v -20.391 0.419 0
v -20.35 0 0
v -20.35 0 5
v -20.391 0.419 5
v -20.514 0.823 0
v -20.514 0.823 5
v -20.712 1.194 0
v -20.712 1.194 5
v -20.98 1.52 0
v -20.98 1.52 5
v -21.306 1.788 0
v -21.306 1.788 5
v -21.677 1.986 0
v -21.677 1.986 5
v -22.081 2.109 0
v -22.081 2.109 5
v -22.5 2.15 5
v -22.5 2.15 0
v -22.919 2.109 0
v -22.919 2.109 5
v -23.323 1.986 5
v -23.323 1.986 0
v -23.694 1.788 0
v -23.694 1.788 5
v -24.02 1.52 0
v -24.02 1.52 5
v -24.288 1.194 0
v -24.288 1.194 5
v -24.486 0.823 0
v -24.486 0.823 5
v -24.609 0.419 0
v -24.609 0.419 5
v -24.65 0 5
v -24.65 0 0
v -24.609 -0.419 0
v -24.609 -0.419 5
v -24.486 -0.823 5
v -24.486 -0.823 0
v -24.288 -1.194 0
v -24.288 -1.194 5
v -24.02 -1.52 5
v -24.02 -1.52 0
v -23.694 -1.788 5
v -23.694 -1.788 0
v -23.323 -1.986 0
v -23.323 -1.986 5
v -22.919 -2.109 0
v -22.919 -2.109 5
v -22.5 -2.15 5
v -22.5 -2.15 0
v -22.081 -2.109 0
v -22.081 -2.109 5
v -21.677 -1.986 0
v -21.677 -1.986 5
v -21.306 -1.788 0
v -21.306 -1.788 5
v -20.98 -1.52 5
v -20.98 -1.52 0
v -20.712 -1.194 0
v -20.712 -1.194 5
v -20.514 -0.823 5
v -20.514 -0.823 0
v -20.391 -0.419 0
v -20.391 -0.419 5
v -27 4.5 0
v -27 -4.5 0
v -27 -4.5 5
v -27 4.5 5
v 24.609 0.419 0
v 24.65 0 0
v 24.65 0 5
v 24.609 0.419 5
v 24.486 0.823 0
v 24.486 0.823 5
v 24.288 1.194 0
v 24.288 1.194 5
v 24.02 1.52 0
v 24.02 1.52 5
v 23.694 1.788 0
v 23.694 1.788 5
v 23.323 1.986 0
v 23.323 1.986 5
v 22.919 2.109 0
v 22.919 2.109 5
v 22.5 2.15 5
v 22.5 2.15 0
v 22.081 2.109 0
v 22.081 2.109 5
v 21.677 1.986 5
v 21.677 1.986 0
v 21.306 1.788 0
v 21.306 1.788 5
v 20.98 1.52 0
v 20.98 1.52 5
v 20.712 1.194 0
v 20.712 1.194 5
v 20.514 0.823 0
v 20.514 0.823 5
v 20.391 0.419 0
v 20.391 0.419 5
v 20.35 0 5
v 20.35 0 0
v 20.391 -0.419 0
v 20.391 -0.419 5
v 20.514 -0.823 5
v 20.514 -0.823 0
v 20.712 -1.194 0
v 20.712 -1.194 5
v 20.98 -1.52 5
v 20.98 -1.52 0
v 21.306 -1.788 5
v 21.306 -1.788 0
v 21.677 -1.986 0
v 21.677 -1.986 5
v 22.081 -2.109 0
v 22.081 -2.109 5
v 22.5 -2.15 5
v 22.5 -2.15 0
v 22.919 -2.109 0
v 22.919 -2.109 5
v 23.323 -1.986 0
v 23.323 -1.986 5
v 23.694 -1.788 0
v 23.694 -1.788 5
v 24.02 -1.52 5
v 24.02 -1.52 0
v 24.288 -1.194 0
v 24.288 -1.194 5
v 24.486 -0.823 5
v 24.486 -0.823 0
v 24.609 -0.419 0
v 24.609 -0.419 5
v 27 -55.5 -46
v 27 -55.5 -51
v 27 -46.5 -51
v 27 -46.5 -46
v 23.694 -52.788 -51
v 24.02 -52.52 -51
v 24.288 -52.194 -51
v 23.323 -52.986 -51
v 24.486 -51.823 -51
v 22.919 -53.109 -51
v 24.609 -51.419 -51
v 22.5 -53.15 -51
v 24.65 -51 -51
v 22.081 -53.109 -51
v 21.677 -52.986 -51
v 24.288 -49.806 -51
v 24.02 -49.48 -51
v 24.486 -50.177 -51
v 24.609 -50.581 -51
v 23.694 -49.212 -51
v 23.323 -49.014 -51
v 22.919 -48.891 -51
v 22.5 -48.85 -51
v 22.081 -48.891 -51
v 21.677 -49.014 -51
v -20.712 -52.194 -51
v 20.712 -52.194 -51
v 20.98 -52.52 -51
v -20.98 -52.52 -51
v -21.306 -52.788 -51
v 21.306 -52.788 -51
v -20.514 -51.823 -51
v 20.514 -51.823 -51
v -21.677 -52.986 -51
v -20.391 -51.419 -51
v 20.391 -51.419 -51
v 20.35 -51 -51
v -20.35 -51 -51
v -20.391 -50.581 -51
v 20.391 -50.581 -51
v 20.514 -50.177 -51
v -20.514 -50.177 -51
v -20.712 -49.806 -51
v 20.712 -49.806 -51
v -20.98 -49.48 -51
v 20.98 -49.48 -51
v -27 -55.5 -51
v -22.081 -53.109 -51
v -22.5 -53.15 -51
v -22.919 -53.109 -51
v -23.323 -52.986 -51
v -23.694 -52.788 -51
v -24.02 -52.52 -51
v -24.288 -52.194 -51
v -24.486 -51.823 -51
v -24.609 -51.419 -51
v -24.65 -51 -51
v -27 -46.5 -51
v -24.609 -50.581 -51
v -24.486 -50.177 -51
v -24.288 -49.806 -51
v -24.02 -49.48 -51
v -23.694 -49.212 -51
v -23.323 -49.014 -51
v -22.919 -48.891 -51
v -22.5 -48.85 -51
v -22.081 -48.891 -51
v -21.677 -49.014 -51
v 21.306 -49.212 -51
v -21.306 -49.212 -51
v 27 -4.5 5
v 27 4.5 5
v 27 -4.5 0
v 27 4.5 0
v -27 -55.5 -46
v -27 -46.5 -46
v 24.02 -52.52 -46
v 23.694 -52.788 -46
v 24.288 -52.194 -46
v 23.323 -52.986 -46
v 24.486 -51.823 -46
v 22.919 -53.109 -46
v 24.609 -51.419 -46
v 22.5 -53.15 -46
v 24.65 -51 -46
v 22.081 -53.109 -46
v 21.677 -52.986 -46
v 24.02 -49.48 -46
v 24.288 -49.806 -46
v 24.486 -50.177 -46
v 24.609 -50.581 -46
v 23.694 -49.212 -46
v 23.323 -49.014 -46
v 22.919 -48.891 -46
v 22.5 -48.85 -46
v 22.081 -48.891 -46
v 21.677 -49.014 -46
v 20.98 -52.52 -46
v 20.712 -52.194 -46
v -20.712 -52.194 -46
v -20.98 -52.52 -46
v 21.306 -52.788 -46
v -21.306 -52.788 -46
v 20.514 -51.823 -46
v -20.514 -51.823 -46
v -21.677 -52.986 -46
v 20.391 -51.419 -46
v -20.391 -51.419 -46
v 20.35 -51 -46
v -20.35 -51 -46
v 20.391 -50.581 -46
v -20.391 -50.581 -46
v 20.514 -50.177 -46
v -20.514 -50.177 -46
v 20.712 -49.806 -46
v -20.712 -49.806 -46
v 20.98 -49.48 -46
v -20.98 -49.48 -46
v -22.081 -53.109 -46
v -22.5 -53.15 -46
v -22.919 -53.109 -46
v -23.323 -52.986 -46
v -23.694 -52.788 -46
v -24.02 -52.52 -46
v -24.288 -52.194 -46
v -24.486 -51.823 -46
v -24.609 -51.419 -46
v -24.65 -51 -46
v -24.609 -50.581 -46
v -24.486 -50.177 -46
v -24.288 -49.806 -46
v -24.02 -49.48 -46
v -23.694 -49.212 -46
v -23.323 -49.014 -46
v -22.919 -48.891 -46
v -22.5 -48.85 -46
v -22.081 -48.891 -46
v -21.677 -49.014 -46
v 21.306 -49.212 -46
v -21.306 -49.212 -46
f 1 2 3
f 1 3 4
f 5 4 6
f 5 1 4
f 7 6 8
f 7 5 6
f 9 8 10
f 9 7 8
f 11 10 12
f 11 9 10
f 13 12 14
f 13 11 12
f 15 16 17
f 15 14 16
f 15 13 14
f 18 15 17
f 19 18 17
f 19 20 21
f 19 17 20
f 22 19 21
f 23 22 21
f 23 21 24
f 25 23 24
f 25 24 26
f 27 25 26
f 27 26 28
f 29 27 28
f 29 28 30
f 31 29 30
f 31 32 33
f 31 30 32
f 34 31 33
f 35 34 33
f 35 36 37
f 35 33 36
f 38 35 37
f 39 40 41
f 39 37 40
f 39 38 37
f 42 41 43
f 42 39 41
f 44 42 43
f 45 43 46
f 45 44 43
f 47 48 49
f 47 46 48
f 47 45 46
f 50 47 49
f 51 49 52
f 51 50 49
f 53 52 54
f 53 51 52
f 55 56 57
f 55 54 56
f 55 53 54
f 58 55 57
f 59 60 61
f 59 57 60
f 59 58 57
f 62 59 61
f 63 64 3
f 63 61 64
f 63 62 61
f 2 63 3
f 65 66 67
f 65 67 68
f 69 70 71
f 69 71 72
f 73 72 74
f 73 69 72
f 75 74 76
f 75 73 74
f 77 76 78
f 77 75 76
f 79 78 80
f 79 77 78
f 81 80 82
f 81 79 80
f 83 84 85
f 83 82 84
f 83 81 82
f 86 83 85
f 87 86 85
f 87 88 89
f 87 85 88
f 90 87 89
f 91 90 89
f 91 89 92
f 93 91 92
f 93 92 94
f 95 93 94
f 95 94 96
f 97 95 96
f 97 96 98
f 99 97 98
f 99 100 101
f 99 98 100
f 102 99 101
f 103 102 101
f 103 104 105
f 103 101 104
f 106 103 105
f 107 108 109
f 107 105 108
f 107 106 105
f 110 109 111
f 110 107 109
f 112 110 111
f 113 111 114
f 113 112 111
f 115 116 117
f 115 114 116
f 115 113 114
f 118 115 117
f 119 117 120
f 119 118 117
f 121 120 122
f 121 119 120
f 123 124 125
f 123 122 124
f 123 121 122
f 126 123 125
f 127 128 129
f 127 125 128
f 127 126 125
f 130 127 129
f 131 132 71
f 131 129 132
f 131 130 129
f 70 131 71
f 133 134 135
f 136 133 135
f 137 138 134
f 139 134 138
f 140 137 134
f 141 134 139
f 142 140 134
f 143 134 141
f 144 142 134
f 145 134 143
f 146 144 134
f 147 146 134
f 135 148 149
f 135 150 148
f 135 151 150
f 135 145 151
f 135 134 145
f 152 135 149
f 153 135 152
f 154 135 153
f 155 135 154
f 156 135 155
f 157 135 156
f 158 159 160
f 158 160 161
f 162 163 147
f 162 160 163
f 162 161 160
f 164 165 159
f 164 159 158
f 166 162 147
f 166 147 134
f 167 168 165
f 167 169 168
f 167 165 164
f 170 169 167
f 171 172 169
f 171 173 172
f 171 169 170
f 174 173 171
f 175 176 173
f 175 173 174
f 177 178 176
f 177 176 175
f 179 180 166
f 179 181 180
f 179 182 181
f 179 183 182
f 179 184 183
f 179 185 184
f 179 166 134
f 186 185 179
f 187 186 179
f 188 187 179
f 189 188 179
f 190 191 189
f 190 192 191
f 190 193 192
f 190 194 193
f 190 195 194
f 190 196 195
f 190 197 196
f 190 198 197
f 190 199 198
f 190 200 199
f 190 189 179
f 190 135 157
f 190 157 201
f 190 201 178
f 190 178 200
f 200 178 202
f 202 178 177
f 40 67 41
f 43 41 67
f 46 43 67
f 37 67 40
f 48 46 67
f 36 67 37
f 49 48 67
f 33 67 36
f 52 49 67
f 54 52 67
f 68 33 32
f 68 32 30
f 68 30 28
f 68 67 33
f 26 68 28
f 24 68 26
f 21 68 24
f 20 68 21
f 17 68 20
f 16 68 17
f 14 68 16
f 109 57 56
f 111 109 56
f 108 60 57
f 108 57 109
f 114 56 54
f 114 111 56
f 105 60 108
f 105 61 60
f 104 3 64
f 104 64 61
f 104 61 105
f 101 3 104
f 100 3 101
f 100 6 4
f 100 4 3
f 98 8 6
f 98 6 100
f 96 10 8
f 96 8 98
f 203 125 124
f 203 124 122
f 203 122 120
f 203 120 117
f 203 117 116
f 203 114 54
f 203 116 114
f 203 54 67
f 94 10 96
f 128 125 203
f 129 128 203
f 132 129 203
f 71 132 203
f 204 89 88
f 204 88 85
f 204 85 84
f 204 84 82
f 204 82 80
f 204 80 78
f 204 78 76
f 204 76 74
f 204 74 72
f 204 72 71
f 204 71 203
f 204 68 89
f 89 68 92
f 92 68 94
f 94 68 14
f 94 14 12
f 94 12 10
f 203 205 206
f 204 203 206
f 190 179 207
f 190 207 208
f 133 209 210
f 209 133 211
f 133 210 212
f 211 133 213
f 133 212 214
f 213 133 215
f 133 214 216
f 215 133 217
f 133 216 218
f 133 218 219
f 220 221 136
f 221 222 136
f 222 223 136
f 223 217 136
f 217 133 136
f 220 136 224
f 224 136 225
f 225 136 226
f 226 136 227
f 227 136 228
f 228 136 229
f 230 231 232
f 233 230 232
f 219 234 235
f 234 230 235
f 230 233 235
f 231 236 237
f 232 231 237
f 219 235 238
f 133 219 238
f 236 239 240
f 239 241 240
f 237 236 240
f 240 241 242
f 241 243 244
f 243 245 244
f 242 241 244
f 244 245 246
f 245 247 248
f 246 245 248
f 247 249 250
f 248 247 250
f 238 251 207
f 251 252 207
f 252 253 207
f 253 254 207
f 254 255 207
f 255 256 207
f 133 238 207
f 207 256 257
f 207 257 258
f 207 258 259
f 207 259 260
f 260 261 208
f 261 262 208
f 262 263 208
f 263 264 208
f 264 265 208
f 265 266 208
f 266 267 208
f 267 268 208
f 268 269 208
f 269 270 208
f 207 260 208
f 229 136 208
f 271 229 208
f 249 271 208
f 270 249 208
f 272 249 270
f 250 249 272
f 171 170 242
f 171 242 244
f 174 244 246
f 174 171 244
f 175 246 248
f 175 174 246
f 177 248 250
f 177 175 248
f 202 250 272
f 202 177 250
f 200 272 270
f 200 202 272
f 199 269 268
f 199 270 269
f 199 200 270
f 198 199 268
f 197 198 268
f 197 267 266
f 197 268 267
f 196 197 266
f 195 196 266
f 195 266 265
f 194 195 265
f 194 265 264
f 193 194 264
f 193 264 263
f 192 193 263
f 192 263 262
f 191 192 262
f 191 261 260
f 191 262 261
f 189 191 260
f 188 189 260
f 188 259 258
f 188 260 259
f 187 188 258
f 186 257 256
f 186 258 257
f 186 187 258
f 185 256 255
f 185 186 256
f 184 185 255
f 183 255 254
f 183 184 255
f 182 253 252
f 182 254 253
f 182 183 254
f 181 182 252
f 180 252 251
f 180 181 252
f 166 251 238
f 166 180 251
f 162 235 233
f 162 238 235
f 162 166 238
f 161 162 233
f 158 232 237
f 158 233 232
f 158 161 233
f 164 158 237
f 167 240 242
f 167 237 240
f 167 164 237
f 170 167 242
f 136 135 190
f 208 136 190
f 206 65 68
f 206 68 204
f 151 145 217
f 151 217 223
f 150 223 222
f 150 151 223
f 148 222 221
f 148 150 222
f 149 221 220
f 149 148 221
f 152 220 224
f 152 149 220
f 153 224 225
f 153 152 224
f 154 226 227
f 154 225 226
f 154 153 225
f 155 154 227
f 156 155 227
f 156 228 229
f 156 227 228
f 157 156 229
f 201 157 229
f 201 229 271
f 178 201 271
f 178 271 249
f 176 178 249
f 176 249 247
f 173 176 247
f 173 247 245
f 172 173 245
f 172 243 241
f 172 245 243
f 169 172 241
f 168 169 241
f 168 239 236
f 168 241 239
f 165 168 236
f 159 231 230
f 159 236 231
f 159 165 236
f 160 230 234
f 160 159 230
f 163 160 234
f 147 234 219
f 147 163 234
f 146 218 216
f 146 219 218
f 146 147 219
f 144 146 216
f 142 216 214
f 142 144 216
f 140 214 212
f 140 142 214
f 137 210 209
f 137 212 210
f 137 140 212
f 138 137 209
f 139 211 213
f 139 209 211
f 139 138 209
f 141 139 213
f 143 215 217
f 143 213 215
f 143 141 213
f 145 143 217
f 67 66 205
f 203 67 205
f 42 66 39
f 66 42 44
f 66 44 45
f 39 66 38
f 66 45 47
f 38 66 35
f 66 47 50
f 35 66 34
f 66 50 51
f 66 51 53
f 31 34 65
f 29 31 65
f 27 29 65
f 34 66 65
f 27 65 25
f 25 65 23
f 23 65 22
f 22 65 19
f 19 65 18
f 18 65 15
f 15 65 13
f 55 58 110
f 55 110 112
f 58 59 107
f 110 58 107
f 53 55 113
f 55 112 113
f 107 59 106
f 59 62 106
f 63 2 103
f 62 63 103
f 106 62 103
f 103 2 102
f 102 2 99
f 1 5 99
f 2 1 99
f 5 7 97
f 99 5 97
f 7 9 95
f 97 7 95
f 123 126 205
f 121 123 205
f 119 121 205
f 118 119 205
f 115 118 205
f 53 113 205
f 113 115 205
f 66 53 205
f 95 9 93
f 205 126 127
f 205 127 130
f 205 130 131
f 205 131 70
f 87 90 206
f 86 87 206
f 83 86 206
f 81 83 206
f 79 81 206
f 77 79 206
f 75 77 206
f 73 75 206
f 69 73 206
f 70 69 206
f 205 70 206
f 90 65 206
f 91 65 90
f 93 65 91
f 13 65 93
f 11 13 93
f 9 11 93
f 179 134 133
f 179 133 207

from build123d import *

# Parameters (mm, degrees)
SKETCH1_W               = 54
SKETCH1_H               = 9
BOSS_EXTRUDE3_DEPTH     = 5
SKETCH2_W               = 54
SKETCH2_H               = 9
BOSS_EXTRUDE4_DEPTH     = 5
CUT_EXTRUDE1_DEPTH      = 84.338166527
CUT_EXTRUDE1_DEPTH_BACK = 84.338166527
SKETCH3_R               = 2.15


with BuildPart() as part:
    # Sketch1 → Boss-Extrude3 (new body)
    with BuildSketch(Plane.XY):
        Rectangle(SKETCH1_W, SKETCH1_H)
    extrude(amount=BOSS_EXTRUDE3_DEPTH)


with BuildPart() as body_2:
    # Sketch2 → Boss-Extrude4 (new body)
    with BuildSketch(Plane(origin=(0, 0, -51), x_dir=(-1, 0, 0), z_dir=(0, 0, -1))):
        with Locations((0, -51)):
            Rectangle(SKETCH2_W, SKETCH2_H)
    extrude(amount=-BOSS_EXTRUDE4_DEPTH)


with BuildPart() as cut_extrude1_tool:
    # Sketch3 → Cut-Extrude1 (new, two sides: drawn at the far end of the back side and taken through both)
    with BuildSketch(Plane.XY.offset(5).offset(-CUT_EXTRUDE1_DEPTH_BACK)):
        with Locations((22.5, 0)):
            Circle(SKETCH3_R)
        with Locations((-22.5, 0)):
            Circle(SKETCH3_R)
        with Locations((-22.5, -51)):
            Circle(SKETCH3_R)
        with Locations((22.5, -51)):
            Circle(SKETCH3_R)
    extrude(amount=CUT_EXTRUDE1_DEPTH + CUT_EXTRUDE1_DEPTH_BACK)


with BuildPart() as part_1:
    add(part.part)

    # Cut-Extrude1: cut by cut_extrude1_tool
    add(cut_extrude1_tool.part, mode=Mode.SUBTRACT)


with BuildPart() as body_2_1:
    add(body_2.part)

    # Cut-Extrude1: cut by cut_extrude1_tool
    add(cut_extrude1_tool.part, mode=Mode.SUBTRACT)


solid = Compound([part_1.part, body_2_1.part])
